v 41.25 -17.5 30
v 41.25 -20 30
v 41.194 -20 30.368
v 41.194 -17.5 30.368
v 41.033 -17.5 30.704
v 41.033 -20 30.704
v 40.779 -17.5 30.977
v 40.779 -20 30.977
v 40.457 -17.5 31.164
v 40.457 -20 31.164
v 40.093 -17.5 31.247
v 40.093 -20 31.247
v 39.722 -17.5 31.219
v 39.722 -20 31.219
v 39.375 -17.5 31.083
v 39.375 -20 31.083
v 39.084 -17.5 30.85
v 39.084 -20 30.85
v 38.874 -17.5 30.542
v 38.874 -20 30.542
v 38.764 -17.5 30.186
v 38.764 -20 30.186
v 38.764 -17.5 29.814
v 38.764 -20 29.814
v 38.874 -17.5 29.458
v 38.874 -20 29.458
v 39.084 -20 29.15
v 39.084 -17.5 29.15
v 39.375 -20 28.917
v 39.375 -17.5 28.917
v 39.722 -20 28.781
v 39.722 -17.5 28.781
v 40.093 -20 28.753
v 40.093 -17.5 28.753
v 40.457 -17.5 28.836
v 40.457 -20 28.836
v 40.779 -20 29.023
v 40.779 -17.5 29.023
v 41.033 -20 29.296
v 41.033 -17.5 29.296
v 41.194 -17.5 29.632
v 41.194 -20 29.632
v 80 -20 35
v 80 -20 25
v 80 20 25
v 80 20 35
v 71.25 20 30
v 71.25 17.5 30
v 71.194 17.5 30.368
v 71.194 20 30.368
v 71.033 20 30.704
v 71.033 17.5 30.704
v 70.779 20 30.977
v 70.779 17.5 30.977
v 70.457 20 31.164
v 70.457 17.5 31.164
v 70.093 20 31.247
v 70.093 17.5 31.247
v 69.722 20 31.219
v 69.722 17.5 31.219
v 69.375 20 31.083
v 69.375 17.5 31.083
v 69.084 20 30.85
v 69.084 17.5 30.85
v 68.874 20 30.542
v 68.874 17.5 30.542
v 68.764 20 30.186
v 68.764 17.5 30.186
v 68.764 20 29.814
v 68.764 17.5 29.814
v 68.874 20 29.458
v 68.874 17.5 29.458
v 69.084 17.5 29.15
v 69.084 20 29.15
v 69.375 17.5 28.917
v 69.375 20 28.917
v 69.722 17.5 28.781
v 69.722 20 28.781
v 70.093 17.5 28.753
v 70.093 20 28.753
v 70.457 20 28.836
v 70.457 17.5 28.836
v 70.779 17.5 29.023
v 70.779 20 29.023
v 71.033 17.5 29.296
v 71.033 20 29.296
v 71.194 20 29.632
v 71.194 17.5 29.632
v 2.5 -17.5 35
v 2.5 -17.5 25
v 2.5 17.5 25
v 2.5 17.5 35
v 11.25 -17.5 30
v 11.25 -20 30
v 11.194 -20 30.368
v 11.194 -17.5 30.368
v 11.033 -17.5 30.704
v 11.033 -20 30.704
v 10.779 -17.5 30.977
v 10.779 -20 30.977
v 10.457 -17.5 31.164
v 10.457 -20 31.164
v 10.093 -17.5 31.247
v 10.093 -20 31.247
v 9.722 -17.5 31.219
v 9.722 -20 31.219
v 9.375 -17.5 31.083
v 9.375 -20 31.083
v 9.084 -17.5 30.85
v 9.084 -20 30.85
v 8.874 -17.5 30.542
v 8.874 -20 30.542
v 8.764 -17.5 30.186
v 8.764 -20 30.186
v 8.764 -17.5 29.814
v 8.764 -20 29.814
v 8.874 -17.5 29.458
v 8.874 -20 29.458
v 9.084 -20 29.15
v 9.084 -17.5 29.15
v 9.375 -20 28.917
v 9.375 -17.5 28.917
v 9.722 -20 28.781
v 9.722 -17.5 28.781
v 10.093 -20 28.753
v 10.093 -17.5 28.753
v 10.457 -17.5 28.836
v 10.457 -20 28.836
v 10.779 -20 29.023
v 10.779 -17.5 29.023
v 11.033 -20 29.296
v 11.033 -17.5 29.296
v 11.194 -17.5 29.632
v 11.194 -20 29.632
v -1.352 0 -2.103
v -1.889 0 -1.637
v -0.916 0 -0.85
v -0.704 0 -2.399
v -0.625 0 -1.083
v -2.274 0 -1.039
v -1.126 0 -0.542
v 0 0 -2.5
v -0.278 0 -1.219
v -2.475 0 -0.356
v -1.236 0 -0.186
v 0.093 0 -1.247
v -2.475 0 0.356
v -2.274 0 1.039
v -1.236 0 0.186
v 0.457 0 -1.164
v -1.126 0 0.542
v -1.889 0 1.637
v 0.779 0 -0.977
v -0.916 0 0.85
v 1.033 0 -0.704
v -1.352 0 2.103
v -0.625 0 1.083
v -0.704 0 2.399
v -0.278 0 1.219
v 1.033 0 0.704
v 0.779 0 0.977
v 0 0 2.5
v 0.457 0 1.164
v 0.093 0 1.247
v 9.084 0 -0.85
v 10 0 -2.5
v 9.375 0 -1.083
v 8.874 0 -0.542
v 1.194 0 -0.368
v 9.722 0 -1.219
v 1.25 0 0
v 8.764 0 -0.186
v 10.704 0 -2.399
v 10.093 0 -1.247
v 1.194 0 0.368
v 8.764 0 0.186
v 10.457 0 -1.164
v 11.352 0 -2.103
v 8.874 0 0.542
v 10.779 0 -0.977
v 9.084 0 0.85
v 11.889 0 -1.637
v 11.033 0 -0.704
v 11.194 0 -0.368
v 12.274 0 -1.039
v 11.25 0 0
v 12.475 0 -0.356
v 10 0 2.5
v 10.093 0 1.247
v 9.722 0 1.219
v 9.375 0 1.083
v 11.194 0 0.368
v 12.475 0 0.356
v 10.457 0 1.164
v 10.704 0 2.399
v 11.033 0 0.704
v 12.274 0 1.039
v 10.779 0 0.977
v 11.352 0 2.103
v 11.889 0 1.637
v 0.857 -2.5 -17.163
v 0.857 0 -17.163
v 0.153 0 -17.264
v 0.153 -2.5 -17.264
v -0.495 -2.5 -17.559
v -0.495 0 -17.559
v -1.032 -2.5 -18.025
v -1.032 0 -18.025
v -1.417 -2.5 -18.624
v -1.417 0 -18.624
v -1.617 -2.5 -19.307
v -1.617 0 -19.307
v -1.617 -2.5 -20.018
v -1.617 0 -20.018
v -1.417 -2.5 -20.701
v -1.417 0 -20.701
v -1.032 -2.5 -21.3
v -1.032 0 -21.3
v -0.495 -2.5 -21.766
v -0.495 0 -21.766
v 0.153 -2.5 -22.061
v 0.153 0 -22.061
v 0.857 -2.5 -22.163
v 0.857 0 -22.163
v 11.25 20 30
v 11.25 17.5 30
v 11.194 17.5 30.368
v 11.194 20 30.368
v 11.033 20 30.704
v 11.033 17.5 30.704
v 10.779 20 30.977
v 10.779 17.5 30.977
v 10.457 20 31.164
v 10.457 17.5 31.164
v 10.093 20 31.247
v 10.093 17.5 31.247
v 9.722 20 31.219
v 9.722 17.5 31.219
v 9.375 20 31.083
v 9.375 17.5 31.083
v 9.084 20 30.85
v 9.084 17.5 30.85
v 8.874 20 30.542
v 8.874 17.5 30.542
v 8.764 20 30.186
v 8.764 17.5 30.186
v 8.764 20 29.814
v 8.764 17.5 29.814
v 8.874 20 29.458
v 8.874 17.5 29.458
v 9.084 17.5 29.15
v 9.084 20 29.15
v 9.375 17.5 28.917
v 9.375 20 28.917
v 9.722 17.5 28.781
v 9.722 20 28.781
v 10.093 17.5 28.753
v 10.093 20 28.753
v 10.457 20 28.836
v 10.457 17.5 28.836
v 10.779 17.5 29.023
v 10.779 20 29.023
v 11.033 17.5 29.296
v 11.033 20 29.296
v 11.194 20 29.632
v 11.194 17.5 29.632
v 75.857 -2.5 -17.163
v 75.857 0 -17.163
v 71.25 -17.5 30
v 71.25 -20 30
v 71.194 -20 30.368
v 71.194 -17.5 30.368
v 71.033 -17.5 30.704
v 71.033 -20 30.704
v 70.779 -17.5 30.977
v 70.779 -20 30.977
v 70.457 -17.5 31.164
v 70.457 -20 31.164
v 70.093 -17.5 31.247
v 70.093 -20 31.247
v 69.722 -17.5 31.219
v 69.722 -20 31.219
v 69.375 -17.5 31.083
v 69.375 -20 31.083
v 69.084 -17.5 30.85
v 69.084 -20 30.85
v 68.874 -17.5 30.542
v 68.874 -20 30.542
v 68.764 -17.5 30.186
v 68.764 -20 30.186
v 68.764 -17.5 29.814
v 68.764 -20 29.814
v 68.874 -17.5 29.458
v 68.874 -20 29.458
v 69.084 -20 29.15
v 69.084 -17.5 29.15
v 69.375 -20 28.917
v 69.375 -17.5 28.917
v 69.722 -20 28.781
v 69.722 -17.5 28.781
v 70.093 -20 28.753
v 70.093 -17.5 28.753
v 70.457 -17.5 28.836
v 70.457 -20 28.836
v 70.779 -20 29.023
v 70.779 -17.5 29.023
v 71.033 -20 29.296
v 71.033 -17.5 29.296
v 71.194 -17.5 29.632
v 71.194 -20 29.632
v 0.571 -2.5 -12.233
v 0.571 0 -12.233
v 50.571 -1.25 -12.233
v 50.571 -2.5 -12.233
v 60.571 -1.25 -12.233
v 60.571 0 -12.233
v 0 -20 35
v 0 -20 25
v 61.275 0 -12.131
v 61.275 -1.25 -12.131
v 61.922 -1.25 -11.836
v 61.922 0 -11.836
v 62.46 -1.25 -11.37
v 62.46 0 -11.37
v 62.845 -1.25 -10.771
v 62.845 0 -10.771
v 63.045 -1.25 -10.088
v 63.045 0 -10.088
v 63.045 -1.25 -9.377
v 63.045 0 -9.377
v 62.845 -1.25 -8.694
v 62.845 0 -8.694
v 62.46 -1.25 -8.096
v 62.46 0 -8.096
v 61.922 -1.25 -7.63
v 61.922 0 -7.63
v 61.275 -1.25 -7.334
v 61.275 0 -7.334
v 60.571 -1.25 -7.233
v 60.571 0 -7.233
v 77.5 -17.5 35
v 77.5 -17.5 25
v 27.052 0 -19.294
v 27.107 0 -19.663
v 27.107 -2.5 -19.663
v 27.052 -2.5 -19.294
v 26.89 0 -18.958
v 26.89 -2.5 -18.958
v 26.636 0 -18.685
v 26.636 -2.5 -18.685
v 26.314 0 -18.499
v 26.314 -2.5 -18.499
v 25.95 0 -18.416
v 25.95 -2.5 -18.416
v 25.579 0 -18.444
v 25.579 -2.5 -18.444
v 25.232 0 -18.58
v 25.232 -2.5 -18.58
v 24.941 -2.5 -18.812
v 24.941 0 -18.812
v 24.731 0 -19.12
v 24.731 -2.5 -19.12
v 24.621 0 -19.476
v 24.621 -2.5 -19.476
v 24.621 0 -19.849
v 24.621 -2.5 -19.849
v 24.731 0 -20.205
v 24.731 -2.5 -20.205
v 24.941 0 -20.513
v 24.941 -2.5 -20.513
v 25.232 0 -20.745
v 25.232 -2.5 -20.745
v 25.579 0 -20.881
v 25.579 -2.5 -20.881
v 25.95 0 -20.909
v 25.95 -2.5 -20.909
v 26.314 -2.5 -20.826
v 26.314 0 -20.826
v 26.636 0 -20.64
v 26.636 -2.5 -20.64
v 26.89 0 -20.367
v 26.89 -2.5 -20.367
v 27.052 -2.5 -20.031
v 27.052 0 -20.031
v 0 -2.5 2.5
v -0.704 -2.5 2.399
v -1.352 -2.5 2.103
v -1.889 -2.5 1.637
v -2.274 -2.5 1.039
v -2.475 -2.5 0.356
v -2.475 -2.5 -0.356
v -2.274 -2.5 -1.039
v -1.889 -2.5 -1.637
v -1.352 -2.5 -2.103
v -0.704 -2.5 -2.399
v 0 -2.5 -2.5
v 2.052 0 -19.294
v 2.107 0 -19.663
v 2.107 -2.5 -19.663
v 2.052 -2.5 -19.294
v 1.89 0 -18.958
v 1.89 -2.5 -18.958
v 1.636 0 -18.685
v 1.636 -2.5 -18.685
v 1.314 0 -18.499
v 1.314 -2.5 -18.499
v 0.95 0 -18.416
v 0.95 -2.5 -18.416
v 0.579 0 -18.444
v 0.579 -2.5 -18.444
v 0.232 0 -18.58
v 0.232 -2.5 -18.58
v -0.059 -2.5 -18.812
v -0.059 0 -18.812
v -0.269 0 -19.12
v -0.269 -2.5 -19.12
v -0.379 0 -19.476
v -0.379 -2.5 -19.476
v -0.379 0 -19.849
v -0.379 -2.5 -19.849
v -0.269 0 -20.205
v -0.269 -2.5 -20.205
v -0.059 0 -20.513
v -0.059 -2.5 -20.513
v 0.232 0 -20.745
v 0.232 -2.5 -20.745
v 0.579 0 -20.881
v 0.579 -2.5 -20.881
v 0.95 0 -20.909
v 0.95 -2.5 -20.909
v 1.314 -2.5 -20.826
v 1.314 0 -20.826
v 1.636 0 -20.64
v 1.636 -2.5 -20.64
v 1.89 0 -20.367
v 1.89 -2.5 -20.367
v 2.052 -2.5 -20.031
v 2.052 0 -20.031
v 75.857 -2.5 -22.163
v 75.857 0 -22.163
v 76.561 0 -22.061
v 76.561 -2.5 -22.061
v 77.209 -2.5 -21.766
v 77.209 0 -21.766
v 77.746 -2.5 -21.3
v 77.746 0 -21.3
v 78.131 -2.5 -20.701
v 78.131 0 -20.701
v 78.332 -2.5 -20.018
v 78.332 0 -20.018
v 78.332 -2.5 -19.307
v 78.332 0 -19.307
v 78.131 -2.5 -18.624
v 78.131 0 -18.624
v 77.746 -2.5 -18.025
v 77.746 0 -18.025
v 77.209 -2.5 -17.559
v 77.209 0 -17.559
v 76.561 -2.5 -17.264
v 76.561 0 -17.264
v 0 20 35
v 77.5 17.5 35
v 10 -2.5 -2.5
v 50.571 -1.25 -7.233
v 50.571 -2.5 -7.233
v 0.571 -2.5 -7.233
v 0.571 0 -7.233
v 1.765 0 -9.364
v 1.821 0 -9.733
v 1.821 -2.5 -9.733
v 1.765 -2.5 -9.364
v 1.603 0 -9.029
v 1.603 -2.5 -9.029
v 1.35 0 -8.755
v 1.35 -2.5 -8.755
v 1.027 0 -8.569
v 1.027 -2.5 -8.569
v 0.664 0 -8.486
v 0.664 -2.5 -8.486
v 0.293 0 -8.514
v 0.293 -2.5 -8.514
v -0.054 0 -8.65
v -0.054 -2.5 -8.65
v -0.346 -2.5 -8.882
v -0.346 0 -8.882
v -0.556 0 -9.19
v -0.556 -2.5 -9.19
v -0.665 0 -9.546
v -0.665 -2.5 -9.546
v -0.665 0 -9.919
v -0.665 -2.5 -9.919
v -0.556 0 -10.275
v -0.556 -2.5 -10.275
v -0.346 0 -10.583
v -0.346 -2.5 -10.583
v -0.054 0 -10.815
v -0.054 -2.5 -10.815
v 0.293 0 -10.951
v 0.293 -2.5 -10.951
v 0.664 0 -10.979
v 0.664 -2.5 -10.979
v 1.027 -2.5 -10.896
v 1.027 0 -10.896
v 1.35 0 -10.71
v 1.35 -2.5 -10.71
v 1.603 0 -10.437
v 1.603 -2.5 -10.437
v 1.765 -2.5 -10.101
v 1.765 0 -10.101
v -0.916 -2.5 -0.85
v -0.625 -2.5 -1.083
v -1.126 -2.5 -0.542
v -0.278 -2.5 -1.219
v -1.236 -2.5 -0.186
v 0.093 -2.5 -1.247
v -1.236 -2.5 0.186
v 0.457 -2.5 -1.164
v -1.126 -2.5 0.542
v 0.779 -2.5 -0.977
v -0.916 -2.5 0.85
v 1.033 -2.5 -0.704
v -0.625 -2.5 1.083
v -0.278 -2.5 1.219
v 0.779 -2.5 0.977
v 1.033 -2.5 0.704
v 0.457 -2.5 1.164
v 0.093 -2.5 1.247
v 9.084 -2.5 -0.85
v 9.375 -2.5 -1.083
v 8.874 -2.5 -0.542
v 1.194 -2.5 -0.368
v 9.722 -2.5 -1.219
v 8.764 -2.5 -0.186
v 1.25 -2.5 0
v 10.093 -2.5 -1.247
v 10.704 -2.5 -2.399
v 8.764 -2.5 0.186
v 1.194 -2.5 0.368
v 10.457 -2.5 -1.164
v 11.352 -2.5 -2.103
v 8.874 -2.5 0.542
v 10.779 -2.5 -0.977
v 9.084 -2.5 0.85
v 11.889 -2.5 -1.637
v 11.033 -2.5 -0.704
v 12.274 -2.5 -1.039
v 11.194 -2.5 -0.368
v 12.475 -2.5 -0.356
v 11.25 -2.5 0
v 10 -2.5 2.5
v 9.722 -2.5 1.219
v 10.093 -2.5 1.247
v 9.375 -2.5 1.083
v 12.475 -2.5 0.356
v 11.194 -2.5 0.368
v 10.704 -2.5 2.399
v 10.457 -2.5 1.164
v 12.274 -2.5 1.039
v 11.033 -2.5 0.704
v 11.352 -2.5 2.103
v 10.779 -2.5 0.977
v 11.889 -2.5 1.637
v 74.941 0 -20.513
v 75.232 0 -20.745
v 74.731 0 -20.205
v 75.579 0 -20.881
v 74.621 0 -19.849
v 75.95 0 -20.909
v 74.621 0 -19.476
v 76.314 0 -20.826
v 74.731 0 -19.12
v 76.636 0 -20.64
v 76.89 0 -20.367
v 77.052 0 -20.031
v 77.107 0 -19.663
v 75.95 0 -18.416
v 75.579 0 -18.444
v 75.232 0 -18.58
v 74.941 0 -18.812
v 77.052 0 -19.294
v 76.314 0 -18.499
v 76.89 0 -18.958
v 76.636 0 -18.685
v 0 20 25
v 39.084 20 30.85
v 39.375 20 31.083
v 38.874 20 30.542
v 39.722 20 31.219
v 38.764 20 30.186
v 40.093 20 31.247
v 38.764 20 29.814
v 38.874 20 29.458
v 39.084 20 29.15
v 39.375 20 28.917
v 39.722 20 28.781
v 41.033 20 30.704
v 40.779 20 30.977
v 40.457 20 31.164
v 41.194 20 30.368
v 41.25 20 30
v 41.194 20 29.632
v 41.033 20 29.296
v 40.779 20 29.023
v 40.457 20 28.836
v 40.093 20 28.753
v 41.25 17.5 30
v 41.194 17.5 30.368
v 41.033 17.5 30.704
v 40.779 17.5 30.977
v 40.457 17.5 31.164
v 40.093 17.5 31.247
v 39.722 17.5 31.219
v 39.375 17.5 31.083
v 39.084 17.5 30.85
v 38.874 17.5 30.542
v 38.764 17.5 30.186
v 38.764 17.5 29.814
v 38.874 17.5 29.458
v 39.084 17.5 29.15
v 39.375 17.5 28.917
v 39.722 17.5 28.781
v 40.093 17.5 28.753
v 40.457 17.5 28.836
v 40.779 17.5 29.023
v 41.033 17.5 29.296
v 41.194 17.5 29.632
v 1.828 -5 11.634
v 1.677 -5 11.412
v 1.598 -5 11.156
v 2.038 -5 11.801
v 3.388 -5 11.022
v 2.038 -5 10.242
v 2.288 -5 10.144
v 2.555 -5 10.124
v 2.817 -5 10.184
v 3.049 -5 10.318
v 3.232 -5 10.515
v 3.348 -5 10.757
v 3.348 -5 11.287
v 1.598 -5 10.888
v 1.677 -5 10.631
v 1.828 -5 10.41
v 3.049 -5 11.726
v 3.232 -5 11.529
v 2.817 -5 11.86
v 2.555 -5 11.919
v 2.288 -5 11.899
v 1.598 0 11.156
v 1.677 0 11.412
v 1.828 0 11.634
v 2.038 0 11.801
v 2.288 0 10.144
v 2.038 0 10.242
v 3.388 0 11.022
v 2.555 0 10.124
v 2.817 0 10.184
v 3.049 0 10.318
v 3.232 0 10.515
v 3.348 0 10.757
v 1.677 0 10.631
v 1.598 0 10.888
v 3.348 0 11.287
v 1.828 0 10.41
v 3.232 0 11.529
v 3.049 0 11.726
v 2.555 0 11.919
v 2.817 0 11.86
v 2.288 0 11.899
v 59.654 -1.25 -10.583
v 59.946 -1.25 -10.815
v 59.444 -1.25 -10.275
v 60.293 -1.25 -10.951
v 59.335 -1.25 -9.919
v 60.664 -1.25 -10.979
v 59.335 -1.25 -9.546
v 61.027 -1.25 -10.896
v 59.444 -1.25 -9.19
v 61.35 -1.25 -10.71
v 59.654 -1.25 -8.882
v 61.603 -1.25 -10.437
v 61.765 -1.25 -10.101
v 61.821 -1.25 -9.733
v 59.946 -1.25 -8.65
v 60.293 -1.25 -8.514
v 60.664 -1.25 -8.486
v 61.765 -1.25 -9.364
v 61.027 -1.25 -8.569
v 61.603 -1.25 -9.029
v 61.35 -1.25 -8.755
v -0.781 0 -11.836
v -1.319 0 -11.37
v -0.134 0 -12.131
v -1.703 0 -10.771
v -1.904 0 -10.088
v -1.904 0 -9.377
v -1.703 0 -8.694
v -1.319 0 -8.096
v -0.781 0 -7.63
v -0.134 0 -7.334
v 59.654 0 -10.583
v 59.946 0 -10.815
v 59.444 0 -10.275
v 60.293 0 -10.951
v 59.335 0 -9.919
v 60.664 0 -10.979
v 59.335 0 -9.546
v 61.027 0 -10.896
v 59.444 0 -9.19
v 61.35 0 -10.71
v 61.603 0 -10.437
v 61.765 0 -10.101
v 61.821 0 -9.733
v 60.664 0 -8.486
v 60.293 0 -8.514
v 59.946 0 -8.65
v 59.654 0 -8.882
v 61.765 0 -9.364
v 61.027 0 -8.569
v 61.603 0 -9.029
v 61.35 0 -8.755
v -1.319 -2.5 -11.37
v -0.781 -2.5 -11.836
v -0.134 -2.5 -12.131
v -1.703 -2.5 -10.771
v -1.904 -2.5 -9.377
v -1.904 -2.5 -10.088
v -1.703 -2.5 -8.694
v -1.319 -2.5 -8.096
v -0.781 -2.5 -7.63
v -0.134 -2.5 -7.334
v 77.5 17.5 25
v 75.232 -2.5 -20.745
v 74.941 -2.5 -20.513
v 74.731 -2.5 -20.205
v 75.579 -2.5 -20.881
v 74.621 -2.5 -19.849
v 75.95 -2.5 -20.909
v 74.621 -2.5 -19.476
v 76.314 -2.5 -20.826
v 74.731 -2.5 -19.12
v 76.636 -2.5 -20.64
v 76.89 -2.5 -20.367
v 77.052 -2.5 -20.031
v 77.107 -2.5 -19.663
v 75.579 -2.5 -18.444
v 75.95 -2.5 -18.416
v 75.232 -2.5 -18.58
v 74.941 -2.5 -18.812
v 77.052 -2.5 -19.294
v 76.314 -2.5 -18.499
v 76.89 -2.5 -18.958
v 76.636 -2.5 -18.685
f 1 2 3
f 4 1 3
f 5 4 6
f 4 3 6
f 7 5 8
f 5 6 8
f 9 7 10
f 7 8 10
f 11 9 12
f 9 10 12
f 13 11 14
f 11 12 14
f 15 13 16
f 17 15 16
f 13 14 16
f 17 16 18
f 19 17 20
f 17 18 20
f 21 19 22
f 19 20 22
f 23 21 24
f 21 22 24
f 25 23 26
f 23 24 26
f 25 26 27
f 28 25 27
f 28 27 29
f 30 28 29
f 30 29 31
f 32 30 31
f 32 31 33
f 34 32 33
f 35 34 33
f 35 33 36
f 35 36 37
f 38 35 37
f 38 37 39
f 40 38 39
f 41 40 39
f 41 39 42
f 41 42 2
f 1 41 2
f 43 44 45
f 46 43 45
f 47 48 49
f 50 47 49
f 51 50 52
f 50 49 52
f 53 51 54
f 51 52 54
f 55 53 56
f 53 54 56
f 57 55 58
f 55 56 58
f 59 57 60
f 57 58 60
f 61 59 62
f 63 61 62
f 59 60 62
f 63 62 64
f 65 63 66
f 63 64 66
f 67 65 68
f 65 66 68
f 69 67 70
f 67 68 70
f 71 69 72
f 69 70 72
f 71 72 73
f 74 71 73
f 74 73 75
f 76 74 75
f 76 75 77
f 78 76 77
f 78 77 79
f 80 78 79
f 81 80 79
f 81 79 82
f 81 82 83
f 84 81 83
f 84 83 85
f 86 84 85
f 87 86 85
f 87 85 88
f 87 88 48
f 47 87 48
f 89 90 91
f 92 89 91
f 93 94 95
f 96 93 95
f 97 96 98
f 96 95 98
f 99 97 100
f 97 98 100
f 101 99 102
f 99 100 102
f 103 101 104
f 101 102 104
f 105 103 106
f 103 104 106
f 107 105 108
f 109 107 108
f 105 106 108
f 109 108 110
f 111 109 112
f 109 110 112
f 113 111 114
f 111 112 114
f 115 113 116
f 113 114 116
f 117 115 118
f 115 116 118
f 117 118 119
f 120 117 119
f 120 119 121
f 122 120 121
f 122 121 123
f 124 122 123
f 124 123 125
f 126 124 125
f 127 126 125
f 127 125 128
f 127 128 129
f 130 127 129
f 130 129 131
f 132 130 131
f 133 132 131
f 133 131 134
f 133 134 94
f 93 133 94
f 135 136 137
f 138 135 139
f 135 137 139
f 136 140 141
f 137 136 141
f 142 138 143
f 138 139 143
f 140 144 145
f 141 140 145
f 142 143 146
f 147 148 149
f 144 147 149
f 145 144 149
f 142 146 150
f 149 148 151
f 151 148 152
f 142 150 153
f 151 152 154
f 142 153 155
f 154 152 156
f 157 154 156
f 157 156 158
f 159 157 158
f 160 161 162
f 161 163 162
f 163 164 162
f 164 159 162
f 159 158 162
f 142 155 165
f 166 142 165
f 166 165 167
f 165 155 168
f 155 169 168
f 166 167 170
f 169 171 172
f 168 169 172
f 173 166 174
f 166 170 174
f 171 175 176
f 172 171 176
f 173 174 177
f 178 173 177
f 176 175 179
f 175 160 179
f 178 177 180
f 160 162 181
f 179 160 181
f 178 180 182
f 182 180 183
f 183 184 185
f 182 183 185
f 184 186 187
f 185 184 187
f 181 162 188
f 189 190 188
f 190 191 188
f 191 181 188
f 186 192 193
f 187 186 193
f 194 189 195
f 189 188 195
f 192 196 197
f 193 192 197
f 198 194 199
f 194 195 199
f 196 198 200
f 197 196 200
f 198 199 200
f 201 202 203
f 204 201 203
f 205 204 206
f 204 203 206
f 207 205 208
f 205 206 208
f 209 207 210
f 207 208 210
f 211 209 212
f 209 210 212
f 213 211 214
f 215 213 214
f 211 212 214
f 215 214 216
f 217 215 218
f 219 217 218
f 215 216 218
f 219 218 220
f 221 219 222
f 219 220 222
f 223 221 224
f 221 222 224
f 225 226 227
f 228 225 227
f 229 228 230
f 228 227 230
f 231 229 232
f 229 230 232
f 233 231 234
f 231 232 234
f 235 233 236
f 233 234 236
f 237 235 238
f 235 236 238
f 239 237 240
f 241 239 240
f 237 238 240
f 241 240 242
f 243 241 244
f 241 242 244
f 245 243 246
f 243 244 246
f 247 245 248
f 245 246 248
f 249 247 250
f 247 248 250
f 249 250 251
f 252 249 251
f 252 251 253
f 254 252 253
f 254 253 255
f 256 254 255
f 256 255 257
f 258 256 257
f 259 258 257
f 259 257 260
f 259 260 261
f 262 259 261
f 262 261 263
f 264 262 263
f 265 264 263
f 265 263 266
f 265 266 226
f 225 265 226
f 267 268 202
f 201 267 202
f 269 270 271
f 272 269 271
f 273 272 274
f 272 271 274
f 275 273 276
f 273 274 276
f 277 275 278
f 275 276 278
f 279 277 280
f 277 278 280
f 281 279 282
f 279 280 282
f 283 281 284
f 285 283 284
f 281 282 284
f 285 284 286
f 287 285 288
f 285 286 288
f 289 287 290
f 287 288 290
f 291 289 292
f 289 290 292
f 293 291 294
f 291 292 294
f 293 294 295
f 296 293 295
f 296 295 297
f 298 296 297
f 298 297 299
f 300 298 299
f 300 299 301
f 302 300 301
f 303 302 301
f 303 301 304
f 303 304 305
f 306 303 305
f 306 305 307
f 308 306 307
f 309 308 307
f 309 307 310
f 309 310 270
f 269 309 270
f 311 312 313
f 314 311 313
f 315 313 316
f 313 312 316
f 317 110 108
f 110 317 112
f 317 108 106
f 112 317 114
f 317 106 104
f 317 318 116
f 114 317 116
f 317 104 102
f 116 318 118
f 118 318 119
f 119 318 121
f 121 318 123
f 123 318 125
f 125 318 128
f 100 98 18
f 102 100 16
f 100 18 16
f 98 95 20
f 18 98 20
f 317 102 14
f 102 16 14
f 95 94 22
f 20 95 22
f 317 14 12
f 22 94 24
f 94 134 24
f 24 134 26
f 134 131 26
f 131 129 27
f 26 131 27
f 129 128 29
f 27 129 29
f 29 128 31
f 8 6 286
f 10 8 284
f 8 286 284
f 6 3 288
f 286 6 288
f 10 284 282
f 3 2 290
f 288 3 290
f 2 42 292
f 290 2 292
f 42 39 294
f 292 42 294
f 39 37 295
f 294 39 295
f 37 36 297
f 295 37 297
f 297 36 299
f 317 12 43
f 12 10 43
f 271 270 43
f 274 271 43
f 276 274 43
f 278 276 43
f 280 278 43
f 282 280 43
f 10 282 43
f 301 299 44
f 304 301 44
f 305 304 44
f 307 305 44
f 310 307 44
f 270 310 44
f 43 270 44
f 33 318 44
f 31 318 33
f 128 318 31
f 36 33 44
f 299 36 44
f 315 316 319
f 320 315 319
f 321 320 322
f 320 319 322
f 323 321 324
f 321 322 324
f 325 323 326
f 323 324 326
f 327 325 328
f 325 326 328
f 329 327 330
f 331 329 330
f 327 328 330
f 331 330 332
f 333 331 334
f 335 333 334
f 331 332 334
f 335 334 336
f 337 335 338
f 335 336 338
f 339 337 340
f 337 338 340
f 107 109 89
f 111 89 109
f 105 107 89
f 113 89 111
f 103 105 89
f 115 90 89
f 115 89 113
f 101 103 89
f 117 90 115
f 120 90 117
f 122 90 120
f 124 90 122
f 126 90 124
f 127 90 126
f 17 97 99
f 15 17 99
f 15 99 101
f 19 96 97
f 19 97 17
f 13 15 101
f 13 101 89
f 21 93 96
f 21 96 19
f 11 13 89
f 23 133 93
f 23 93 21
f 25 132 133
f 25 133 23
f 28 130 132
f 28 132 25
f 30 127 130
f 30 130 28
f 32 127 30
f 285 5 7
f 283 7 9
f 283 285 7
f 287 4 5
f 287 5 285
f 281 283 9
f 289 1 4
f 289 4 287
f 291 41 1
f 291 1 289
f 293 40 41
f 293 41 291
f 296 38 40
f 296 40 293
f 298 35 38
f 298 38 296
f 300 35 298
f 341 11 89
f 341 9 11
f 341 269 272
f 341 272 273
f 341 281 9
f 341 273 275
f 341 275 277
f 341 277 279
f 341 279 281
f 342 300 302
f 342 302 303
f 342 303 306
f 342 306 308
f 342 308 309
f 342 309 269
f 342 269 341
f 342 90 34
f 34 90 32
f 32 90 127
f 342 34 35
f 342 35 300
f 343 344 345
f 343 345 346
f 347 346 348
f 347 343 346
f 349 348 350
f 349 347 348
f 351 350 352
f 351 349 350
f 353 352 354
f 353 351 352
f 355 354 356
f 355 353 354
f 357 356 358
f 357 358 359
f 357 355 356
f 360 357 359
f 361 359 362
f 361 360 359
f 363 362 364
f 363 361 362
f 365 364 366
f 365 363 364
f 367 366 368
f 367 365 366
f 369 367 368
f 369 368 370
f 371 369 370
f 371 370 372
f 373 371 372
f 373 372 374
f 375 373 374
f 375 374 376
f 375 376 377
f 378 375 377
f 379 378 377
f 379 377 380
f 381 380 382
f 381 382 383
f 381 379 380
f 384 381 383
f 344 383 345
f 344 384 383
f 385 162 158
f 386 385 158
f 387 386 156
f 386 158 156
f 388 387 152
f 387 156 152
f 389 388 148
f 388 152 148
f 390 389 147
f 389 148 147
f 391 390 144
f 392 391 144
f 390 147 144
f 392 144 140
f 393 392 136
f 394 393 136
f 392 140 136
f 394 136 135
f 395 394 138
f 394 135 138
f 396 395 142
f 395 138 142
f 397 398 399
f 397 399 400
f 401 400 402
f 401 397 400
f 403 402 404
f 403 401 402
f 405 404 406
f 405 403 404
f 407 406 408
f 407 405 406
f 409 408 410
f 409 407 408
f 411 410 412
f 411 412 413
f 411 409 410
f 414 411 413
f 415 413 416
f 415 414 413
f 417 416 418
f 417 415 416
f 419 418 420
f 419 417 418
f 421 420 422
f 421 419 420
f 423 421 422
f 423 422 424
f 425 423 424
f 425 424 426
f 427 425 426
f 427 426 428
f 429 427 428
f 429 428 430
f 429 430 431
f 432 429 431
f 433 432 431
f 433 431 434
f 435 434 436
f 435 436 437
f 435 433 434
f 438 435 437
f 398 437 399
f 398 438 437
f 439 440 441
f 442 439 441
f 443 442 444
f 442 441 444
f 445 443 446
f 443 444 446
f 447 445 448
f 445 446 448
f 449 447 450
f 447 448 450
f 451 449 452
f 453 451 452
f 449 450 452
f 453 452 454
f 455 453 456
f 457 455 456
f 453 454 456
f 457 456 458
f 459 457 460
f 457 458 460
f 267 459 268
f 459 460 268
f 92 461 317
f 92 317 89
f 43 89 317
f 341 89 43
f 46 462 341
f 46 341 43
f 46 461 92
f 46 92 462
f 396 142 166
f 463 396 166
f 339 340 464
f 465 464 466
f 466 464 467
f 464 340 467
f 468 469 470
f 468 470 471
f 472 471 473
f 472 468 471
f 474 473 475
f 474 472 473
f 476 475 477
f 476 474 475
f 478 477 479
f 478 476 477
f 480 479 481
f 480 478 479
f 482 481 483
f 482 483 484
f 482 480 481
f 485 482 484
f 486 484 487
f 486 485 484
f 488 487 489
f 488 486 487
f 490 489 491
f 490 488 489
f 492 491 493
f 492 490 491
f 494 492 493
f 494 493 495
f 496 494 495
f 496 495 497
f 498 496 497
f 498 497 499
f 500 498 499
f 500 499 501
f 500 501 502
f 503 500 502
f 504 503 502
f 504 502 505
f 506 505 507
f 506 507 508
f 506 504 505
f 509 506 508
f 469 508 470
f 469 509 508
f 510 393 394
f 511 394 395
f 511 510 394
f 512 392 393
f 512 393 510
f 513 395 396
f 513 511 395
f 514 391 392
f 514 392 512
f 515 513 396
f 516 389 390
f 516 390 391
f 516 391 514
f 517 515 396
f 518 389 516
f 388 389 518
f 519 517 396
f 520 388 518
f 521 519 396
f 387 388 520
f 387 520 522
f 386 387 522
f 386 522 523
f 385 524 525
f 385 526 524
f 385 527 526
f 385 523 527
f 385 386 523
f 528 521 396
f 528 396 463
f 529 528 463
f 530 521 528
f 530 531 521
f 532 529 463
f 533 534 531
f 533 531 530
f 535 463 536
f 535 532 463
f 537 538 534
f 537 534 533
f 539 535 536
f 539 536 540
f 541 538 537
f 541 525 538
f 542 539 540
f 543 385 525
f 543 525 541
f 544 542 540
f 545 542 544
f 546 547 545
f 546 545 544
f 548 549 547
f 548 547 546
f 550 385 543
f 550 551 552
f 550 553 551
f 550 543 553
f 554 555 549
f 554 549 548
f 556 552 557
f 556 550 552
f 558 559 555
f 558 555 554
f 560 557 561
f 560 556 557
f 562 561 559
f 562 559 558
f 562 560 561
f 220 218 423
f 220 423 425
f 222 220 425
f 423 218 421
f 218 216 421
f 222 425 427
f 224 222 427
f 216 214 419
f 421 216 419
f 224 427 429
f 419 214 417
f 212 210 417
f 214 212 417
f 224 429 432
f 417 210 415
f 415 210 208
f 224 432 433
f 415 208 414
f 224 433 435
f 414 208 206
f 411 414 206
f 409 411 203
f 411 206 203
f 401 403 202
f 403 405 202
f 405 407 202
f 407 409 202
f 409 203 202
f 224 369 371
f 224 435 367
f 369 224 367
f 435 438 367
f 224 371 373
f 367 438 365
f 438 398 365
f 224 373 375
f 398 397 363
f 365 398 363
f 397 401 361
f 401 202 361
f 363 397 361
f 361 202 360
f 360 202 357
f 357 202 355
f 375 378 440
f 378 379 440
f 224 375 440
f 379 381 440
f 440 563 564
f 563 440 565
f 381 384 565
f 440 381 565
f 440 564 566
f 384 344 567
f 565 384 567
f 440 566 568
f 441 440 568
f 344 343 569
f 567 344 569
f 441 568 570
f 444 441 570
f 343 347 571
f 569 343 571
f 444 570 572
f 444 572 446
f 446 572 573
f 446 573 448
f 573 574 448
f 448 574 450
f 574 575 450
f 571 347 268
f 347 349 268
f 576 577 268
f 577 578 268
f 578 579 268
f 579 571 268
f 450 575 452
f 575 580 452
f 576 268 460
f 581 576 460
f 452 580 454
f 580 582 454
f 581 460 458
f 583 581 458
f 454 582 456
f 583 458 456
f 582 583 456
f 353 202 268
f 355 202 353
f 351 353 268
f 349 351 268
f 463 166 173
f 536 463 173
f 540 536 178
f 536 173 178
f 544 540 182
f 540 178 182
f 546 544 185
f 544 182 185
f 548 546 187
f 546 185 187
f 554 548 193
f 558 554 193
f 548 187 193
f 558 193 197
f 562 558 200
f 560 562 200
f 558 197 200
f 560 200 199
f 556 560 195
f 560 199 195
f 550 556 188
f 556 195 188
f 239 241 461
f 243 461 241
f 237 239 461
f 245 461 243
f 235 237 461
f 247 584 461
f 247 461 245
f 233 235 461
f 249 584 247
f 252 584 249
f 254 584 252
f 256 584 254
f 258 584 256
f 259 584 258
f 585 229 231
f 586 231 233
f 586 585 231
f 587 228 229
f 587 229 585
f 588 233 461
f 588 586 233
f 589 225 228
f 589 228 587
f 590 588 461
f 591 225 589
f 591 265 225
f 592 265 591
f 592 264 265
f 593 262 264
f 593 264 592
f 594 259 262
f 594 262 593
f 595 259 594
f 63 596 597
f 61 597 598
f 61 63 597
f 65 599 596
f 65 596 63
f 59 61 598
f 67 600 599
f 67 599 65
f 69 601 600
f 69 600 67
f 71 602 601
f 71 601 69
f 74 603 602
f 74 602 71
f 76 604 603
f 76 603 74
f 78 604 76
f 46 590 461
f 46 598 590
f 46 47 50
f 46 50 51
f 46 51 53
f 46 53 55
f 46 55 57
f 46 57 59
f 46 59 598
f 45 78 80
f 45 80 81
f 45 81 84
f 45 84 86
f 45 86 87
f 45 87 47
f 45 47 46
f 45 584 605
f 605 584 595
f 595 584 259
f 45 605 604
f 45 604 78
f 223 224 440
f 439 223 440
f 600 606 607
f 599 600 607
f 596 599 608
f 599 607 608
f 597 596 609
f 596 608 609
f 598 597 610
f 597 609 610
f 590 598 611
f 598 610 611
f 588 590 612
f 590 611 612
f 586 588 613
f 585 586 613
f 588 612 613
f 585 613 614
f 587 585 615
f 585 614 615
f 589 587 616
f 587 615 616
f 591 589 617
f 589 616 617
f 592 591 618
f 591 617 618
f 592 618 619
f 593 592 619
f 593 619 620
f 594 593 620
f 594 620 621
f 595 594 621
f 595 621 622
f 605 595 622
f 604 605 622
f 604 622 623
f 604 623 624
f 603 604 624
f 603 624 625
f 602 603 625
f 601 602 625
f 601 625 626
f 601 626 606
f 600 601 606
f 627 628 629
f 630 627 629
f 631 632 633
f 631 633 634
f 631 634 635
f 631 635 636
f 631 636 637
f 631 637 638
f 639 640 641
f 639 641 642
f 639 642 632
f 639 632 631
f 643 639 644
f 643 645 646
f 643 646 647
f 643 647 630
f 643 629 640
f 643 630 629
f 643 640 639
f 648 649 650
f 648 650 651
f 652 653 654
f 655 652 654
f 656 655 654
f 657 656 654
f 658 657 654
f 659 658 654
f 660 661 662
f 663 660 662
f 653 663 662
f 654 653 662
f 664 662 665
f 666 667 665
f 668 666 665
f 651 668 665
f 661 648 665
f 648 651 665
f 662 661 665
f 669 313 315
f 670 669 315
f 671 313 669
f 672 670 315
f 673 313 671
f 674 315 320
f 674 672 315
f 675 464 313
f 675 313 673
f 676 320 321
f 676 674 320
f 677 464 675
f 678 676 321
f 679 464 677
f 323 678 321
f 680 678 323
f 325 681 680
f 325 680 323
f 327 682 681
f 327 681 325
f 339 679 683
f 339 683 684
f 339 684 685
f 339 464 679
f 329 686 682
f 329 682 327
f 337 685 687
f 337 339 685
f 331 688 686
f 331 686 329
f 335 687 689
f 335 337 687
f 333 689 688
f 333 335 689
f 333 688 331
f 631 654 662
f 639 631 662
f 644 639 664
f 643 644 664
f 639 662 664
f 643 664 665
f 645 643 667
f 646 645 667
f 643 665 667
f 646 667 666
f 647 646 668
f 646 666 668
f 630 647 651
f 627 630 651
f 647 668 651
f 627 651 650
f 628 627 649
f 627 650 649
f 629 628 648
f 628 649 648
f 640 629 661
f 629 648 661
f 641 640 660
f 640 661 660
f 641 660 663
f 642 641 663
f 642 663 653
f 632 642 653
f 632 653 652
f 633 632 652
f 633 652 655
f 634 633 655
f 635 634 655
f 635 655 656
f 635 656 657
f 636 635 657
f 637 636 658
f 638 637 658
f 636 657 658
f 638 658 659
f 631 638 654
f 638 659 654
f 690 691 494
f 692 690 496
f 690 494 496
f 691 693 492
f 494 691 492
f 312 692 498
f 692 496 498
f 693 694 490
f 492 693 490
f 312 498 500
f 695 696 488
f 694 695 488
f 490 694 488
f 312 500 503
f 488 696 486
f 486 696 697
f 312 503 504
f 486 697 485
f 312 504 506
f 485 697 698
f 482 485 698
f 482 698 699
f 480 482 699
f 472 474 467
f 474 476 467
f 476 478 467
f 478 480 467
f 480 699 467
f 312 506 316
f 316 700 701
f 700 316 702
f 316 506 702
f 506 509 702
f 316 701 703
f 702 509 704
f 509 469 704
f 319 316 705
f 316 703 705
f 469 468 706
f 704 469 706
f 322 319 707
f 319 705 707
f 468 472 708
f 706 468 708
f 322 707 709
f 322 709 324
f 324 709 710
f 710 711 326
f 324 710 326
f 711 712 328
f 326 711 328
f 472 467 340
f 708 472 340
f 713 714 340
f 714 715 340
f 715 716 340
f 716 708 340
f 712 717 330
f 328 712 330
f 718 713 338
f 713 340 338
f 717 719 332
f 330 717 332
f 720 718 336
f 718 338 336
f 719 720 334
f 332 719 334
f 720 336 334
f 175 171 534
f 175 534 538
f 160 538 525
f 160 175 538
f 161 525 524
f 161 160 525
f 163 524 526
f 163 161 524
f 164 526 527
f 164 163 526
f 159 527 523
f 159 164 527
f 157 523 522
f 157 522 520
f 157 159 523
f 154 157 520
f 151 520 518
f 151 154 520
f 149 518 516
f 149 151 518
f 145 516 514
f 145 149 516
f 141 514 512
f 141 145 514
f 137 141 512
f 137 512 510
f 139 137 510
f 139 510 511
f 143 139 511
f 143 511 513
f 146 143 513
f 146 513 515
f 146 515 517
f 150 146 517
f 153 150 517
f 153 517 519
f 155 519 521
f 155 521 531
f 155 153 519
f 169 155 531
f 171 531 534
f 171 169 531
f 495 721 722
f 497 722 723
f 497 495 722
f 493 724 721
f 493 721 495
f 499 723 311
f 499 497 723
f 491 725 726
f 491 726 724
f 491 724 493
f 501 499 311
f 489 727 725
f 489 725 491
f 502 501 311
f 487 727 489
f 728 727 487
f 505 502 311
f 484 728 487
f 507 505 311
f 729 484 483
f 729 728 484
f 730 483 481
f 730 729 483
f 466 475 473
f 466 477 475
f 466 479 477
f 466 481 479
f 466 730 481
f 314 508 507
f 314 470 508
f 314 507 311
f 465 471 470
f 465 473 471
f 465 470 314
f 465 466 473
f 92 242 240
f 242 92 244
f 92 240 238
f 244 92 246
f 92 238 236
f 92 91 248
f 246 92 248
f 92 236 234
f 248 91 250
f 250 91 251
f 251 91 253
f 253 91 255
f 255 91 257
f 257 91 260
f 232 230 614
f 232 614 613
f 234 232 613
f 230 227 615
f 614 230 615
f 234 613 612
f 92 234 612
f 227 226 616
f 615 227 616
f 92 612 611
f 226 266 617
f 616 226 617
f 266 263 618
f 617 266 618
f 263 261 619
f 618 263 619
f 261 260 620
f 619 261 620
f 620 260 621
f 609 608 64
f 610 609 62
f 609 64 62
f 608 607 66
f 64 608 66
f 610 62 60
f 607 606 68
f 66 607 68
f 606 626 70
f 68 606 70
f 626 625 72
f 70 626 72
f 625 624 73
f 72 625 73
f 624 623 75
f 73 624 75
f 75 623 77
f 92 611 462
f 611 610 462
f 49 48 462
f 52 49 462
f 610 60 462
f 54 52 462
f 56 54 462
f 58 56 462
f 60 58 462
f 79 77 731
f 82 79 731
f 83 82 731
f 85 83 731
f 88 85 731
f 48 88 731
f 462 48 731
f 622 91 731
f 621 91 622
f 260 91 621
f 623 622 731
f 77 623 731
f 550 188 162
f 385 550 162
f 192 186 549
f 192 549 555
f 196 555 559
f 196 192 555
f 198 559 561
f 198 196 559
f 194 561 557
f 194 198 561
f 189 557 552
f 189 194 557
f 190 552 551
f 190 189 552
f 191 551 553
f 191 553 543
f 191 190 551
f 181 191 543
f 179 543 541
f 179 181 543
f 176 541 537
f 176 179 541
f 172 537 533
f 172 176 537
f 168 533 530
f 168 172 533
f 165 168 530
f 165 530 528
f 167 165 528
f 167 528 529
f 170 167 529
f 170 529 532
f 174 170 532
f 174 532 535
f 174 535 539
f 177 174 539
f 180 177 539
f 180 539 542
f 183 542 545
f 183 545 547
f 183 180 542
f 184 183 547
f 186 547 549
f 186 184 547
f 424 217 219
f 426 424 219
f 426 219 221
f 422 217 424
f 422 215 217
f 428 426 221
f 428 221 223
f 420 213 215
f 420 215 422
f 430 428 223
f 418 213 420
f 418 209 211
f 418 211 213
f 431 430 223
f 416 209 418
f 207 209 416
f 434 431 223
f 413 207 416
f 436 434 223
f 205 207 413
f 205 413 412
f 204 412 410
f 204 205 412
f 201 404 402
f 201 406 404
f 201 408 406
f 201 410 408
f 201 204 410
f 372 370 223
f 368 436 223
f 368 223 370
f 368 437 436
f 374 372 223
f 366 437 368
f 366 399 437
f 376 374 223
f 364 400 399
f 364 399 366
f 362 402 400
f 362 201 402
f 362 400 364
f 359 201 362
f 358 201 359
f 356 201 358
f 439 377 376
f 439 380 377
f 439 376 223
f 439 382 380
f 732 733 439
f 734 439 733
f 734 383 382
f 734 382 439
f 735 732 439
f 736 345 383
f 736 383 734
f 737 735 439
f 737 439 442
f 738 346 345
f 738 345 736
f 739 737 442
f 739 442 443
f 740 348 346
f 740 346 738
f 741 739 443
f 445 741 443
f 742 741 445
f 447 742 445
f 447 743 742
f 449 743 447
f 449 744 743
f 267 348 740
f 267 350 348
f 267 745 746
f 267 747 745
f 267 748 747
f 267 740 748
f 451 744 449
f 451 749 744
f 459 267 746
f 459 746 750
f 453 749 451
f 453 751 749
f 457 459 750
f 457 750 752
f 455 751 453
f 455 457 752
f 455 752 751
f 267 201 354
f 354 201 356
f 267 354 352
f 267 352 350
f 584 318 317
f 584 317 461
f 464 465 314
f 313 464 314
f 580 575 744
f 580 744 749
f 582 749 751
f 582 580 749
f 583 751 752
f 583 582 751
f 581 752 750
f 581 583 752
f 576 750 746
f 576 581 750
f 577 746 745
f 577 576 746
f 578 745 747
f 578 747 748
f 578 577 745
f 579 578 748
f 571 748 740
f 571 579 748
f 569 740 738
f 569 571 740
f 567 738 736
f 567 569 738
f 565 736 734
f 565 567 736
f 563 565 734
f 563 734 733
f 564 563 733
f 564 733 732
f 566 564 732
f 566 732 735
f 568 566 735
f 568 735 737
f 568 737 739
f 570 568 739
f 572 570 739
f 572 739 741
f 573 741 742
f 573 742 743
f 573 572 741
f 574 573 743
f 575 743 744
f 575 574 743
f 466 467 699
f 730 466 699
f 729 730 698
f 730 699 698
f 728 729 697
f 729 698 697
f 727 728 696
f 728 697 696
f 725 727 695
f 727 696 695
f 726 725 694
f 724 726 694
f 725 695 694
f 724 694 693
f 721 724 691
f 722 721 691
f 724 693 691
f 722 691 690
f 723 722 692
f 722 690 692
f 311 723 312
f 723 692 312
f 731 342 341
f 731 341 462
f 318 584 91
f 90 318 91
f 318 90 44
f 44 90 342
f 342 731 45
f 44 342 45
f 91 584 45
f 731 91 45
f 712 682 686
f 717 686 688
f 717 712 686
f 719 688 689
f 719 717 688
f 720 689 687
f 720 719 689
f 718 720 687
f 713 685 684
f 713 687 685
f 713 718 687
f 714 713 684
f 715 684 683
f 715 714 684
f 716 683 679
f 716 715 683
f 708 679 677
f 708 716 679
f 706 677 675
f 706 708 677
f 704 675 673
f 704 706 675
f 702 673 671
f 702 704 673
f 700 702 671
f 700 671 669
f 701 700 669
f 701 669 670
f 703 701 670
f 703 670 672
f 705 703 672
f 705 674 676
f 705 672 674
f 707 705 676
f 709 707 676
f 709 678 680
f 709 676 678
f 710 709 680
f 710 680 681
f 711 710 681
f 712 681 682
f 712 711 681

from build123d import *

# Parameters (mm, degrees)
F1_R      = 1.25
F2_DEPTH  = 2.5
F3_R      = 1.25
F4_DEPTH  = 2.5
F5_R      = 1.25
F6_DEPTH  = 2.5
F8_W      = 80
F8_H      = 40
F8_W_2    = 75
F8_H_2    = 35
F9_DEPTH  = 10
F10_R     = 1.25
F11_DEPTH = 40.001
F12_R     = 0.9
F13_DEPTH = 5
F15_DEPTH = 1.25


with BuildPart() as f2:
    # F1 (on Front) → F2 (new body)
    with BuildSketch(Plane.XZ):
        with BuildLine():
            Line((10, 2.5), (0, 2.5))
            ThreePointArc((0, 2.5), (-2.5, 0), (0, -2.5))
            Line((0, -2.5), (10, -2.5))
            ThreePointArc((10, -2.5), (12.5, 0), (10, 2.5))
        make_face()
        Circle(F1_R, mode=Mode.SUBTRACT)
        with Locations((10, 0)):
            Circle(F1_R, mode=Mode.SUBTRACT)
    extrude(amount=F2_DEPTH)


with BuildPart() as f4:
    # F3 (on Front) → F4 (new body)
    with BuildSketch(Plane.XZ):
        with BuildLine():
            Line((60.5706622079, -7.232673876), (0.5706622079, -7.232673876))
            ThreePointArc((0.5706622079, -7.232673876), (-1.9293377921, -9.732673876), (0.5706622079, -12.232673876))
            Line((0.5706622079, -12.232673876), (60.5706622079, -12.232673876))
            ThreePointArc((60.5706622079, -12.232673876), (63.0706622079, -9.732673876), (60.5706622079, -7.232673876))
        make_face()
        with Locations((0.5706622079, -9.732673876)):
            Circle(F3_R, mode=Mode.SUBTRACT)
        with Locations((60.5706622079, -9.732673876)):
            Circle(F3_R, mode=Mode.SUBTRACT)
    extrude(amount=F4_DEPTH)

    # F14 (on face) → F15 (cut)
    with BuildSketch(Plane.XZ.offset(2.5)):
        with BuildLine():
            Line((50.5706622079, -12.232673876), (60.5706622079, -12.232673876))
            ThreePointArc((60.5706622079, -12.232673876), (63.0706622079, -9.732673876), (60.5706622079, -7.232673876))
            Line((60.5706622079, -7.232673876), (50.5706622079, -7.232673876))
            Line((50.5706622079, -7.232673876), (50.5706622079, -12.232673876))
        make_face()
    extrude(amount=-F15_DEPTH, mode=Mode.SUBTRACT)


with BuildPart() as f6:
    # F5 (on Front) → F6 (new body)
    with BuildSketch(Plane.XZ):
        with BuildLine():
            Line((75.8570737601, -17.1626018733), (0.8570737601, -17.1626018733))
            ThreePointArc((0.8570737601, -17.1626018733), (-1.6429262399, -19.6626018733), (0.8570737601, -22.1626018733))
            Line((0.8570737601, -22.1626018733), (75.8570737601, -22.1626018733))
            ThreePointArc((75.8570737601, -22.1626018733), (78.3570737601, -19.6626018733), (75.8570737601, -17.1626018733))
        make_face()
        with Locations((0.8570737601, -19.6626018733)):
            Circle(F5_R, mode=Mode.SUBTRACT)
        with Locations((25.8570737601, -19.6626018733)):
            Circle(F5_R, mode=Mode.SUBTRACT)
        with Locations((75.8570737601, -19.6626018733)):
            Circle(F5_R, mode=Mode.SUBTRACT)
    extrude(amount=F6_DEPTH)


with BuildPart() as f9:
    # F8 (on offset) → F9 (new body)
    with BuildSketch(Plane.XY.offset(25)):
        with Locations((40, 0)):
            Rectangle(F8_W, F8_H)
        with Locations((40, 0)):
            Rectangle(F8_W_2, F8_H_2, mode=Mode.SUBTRACT)
    extrude(amount=F9_DEPTH)

    # F10 (on face) → F11 (cut, through all)
    with BuildSketch(Plane.XZ.offset(20)):
        with Locations((10, 30)):
            Circle(F10_R)
        with Locations((70, 30)):
            Circle(F10_R)
        with Locations((40, 30)):
            Circle(F10_R)
    extrude(amount=-F11_DEPTH, mode=Mode.SUBTRACT)


with BuildPart() as f13:
    # F12 (on Front) → F13 (new body)
    with BuildSketch(Plane.XZ):
        with Locations((2.488047583, 11.0218990594)):
            Circle(F12_R)
    extrude(amount=F13_DEPTH)


solid = Compound([f2.part, f4.part, f6.part, f9.part, f13.part])
